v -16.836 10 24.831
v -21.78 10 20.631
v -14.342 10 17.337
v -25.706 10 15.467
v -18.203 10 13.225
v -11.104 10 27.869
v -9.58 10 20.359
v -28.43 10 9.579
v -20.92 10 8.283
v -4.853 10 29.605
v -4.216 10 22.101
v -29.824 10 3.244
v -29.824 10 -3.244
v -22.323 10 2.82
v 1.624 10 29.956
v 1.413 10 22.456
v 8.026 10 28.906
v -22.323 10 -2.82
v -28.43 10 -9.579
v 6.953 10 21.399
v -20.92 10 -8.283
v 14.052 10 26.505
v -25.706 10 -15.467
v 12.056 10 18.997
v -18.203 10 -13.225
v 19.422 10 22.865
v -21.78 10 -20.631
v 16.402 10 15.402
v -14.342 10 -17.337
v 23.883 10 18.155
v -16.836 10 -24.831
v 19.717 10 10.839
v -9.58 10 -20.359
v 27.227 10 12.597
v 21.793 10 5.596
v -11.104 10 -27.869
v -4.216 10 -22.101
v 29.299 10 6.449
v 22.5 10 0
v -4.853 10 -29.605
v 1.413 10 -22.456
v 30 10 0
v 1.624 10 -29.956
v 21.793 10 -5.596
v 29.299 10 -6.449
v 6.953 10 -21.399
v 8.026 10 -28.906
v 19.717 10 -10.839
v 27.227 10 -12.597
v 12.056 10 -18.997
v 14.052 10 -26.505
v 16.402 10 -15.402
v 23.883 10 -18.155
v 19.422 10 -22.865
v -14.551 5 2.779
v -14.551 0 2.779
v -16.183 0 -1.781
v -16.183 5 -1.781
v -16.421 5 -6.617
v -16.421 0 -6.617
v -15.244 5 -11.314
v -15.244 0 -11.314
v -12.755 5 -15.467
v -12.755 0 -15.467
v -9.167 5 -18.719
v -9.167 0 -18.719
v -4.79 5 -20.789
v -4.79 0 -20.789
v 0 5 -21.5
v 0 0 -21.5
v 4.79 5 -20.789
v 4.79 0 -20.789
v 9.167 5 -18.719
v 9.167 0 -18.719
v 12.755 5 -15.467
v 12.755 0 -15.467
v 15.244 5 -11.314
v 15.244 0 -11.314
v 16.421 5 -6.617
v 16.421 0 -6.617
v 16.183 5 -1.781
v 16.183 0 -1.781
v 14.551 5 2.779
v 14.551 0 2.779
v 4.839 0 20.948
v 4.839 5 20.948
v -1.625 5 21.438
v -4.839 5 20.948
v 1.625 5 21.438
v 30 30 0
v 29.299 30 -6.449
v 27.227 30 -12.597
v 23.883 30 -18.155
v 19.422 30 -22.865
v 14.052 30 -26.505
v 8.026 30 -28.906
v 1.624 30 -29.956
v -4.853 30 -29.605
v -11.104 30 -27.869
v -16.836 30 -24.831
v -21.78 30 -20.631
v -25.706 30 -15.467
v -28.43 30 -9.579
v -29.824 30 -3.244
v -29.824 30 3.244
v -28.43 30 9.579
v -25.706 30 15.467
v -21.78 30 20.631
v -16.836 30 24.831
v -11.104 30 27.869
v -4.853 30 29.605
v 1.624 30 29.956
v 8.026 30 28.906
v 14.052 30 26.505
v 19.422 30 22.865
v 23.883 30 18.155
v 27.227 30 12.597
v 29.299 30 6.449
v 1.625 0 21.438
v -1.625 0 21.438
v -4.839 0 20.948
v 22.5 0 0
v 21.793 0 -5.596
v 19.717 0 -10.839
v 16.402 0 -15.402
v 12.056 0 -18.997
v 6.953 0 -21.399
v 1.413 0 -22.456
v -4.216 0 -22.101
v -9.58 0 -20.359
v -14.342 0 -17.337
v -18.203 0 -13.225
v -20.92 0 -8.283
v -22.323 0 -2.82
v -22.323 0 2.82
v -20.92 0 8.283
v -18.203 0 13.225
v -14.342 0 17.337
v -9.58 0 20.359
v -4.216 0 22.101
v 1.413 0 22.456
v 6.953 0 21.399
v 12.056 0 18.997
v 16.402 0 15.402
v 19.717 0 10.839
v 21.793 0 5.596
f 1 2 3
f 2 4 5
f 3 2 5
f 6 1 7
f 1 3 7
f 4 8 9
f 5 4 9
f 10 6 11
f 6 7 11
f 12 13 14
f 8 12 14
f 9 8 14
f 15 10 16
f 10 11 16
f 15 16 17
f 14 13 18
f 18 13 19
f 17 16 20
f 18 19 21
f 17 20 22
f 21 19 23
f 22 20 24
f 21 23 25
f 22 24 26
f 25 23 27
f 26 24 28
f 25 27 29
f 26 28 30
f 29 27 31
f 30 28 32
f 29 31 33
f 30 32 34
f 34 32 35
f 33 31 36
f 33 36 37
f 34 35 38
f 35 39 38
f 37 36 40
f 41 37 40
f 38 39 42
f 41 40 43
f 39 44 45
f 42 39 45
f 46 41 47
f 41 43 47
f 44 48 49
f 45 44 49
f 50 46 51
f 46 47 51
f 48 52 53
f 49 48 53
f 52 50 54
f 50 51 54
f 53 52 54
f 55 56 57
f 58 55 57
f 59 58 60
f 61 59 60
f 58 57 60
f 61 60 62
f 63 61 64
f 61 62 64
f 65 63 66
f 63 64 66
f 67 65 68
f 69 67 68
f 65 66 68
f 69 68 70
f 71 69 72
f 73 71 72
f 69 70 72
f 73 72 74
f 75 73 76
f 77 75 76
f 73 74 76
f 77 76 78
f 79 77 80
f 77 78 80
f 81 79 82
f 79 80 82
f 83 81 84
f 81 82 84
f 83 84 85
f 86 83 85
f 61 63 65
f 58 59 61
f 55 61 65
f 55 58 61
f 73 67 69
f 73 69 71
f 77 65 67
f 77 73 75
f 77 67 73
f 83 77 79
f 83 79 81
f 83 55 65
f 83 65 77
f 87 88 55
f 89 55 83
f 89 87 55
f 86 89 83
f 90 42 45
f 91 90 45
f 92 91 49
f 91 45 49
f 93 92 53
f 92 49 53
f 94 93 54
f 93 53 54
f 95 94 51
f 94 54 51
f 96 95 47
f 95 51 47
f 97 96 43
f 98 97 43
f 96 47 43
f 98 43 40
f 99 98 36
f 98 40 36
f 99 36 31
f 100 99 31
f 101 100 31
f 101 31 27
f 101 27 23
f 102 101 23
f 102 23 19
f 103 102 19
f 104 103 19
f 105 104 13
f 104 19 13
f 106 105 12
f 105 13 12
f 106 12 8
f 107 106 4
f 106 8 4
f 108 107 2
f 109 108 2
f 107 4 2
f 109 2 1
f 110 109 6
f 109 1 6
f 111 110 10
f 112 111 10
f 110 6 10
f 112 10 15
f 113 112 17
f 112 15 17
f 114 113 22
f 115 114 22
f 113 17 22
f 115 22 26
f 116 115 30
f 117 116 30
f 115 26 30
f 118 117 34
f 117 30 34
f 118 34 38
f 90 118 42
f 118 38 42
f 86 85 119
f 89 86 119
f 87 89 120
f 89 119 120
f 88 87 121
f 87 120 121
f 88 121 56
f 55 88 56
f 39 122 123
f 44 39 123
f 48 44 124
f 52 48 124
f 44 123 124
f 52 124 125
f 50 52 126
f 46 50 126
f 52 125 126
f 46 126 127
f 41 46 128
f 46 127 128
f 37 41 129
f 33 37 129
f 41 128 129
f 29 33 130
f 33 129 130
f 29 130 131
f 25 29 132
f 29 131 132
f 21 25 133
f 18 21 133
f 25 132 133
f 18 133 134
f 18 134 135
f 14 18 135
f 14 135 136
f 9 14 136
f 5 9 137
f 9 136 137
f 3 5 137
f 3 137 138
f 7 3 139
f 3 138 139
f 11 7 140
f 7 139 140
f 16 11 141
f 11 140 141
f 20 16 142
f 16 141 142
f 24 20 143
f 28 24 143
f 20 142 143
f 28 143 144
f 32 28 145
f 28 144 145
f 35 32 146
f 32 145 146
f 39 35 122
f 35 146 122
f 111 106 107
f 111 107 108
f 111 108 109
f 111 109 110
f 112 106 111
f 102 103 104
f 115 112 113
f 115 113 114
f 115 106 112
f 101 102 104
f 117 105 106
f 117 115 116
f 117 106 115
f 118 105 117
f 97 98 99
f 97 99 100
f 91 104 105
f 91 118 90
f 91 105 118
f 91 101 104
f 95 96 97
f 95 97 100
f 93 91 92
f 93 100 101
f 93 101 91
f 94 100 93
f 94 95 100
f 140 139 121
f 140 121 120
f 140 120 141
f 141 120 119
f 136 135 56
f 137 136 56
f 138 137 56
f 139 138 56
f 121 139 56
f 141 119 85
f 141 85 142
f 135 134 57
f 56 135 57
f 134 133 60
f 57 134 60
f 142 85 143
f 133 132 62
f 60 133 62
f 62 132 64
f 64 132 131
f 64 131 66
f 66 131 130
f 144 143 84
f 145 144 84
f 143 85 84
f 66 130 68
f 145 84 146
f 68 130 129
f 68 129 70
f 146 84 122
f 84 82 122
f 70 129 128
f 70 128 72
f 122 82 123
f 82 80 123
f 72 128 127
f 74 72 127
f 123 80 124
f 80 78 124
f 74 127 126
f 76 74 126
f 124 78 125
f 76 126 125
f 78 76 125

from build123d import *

# Parameters (mm, degrees)
SKETCH1_R           = 22.5
BOSS_EXTRUDE1_DEPTH = 10
SKETCH2_R           = 30
BOSS_EXTRUDE2_DEPTH = 20
SKETCH3_R           = 16.5
CUT_EXTRUDE2_DEPTH  = 5


with BuildPart() as part:
    # Sketch1 → Boss-Extrude1 (new body)
    with BuildSketch(Plane(origin=(0, 0, 0), x_dir=(1, 0, 0), z_dir=(0, 1, 0))):
        Circle(SKETCH1_R)
    extrude(amount=BOSS_EXTRUDE1_DEPTH)

    # Sketch2 → Boss-Extrude2 (add)
    with BuildSketch(Plane(origin=(0, 10, 0), x_dir=(1, 0, 0), z_dir=(0, 1, 0))):
        Circle(SKETCH2_R)
    extrude(amount=BOSS_EXTRUDE2_DEPTH)

    # Sketch3 → Cut-Extrude2 (cut)
    with BuildSketch(Plane.XZ):
        with BuildLine():
            ThreePointArc((-14.551420086, 2.778571429), (0, 11.5), (14.551420086, 2.778571429))
            Line((14.551420086, 2.778571429), (4.83856504, 20.948467447))
            ThreePointArc((4.83856504, 20.948467447), (0, 21.5), (-4.83856504, 20.948467447))
            Line((-4.83856504, 20.948467447), (-14.551420086, 2.778571429))
        make_face()
        with Locations((0, -5)):
            Circle(SKETCH3_R)
    extrude(amount=-CUT_EXTRUDE2_DEPTH, mode=Mode.SUBTRACT)


solid = part.part
